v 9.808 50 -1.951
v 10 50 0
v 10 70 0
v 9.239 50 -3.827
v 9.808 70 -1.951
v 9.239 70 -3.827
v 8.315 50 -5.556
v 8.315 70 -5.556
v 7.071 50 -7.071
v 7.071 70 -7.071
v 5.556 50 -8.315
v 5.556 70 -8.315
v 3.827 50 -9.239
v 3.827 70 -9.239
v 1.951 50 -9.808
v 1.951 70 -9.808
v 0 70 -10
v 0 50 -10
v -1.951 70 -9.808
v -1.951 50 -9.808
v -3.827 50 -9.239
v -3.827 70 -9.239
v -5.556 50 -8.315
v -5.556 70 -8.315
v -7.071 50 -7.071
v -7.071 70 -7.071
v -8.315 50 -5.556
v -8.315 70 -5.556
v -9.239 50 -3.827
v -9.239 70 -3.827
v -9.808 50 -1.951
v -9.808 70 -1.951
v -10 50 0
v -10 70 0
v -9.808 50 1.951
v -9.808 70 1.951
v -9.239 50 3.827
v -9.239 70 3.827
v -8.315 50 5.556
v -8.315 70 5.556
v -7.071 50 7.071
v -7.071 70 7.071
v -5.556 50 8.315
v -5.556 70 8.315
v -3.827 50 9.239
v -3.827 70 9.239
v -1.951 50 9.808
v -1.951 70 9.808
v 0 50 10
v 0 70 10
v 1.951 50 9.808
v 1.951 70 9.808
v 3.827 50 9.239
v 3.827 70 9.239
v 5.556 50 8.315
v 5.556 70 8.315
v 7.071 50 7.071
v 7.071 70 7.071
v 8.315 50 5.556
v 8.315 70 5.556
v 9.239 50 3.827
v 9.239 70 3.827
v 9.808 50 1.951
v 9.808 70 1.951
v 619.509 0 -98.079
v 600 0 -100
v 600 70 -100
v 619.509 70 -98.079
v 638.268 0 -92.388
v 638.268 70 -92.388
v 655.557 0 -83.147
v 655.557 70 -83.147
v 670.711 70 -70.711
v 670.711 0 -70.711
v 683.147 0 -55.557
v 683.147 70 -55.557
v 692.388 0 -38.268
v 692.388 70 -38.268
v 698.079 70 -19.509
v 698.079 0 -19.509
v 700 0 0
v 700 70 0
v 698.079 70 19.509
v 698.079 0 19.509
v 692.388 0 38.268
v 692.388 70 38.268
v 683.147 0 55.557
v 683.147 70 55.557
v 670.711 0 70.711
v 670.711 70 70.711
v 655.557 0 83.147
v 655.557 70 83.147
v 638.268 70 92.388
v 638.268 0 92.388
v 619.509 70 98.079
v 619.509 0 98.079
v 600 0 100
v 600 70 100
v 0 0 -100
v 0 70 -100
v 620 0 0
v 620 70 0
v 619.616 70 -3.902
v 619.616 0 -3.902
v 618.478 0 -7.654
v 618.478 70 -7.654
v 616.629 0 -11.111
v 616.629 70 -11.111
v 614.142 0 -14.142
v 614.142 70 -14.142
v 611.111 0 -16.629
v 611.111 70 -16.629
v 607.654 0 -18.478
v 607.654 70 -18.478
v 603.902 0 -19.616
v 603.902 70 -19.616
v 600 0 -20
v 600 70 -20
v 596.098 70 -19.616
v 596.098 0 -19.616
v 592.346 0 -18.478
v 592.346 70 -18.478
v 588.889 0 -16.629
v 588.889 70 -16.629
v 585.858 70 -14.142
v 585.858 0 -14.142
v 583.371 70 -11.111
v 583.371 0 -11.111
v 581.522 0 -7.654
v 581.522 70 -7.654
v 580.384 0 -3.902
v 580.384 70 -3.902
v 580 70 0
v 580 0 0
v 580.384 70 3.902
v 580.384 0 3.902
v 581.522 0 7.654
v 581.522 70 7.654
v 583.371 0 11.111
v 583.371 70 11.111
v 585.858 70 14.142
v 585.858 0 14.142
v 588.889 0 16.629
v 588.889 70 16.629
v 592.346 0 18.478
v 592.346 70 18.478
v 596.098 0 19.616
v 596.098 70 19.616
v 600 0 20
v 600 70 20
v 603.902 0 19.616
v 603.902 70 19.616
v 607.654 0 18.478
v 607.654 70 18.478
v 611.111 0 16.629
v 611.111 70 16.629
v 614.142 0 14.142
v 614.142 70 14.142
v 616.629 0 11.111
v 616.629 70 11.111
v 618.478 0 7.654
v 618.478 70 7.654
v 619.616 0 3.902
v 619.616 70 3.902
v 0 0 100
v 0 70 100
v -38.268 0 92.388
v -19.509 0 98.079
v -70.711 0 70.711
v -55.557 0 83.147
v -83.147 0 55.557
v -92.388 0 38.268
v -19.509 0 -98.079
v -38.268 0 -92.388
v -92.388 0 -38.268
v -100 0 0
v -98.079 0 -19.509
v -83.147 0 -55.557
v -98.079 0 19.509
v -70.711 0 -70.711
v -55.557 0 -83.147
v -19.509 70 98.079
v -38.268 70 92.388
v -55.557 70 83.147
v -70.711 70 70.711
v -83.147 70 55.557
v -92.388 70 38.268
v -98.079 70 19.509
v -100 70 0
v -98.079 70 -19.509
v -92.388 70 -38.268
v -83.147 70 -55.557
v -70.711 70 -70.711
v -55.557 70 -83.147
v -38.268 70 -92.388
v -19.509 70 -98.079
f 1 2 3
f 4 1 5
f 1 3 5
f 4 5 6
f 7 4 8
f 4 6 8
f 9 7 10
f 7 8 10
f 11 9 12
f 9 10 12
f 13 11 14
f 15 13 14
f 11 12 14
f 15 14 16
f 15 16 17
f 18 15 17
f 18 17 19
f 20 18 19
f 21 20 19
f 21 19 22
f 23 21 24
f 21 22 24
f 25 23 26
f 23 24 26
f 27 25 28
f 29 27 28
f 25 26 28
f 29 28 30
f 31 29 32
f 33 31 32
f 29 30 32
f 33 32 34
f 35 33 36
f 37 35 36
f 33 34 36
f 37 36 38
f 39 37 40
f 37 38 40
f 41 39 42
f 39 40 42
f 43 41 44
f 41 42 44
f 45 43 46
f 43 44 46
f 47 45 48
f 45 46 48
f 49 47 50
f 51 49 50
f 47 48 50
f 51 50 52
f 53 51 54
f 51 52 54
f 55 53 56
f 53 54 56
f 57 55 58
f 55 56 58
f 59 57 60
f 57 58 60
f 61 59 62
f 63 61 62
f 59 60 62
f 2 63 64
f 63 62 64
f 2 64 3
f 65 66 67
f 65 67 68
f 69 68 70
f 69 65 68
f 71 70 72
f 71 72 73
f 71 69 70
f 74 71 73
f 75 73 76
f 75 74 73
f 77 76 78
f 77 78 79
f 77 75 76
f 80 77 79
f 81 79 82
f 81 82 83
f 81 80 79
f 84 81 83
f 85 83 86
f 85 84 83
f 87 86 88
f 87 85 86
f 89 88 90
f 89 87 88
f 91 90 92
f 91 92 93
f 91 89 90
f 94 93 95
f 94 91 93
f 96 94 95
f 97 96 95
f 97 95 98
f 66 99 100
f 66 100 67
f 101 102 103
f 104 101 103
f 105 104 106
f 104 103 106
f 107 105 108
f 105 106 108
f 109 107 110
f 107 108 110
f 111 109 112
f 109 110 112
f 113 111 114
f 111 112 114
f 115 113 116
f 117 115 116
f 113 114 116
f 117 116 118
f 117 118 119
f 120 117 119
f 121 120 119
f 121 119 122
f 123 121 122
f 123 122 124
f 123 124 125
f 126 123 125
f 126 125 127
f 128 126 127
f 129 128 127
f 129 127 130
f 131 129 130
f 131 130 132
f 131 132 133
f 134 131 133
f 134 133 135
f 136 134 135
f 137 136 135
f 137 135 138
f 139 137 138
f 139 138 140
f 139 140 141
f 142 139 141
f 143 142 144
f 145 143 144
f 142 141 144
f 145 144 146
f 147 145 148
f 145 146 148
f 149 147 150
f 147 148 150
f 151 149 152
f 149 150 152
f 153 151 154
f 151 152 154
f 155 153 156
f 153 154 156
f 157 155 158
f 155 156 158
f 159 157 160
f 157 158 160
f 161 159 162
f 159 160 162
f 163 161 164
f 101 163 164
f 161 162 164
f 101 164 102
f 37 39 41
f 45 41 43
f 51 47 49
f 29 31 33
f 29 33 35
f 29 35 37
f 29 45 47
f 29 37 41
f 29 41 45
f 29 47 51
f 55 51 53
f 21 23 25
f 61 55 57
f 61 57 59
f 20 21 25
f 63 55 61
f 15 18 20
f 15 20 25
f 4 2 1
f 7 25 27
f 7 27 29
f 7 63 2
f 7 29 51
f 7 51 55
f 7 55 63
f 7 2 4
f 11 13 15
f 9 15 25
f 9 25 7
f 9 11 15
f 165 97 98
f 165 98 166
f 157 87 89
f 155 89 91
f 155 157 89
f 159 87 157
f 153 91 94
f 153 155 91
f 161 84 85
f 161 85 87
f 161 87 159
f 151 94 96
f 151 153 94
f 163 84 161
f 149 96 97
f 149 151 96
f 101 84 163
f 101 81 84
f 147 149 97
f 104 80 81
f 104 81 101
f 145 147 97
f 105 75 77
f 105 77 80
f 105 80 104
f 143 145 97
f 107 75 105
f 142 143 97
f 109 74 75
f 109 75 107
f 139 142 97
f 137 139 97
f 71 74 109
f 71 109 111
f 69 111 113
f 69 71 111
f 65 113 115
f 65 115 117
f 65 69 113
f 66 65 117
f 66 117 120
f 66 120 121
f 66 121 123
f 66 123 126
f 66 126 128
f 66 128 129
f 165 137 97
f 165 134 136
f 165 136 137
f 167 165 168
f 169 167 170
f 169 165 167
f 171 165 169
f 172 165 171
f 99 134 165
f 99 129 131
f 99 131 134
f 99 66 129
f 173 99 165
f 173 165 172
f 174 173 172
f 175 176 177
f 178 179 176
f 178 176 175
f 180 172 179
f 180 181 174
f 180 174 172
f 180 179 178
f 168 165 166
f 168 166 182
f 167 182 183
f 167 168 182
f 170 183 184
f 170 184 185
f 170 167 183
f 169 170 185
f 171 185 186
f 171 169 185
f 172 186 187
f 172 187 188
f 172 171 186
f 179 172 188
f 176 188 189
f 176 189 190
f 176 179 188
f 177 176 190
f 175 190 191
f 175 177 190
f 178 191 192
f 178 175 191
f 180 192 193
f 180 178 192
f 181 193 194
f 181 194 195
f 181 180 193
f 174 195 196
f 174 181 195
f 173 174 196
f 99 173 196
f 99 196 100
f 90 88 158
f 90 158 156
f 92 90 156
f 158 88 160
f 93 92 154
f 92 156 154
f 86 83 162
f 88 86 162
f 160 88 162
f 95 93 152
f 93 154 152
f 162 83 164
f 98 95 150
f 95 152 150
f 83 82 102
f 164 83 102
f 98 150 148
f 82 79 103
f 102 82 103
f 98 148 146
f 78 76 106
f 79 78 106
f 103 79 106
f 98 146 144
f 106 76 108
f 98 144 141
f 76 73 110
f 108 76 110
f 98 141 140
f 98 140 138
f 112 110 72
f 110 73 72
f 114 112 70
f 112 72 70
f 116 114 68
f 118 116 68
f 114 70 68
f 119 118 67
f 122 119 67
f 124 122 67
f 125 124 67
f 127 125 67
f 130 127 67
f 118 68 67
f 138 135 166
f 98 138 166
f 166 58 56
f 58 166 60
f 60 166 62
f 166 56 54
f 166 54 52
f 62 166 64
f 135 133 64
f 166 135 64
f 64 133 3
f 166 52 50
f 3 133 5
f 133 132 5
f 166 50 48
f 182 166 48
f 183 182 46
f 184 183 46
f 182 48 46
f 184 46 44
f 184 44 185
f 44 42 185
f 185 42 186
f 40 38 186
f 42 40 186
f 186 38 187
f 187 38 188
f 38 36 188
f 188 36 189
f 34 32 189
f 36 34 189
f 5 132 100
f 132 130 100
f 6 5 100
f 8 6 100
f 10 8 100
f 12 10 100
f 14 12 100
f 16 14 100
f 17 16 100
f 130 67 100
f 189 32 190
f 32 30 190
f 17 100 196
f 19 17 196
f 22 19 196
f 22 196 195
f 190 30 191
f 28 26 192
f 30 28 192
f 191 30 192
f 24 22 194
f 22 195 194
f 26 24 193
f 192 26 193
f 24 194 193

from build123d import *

# Parameters (mm, degrees)
BOSS_EXTRUDE1_DEPTH = 70
SKETCH2_R           = 10
CUT_EXTRUDE1_DEPTH  = 20
SKETCH3_R           = 20
CUT_EXTRUDE2_DEPTH  = 71


with BuildPart() as part:
    # Sketch1 → Boss-Extrude1 (new body)
    with BuildSketch(Plane(origin=(0, 0, 0), x_dir=(1, 0, 0), z_dir=(0, 1, 0))):
        with BuildLine():
            Line((0, 100), (600, 100))
            ThreePointArc((600, 100), (700, 0), (600, -100))
            Line((600, -100), (0, -100))
            ThreePointArc((0, -100), (-100, 0), (0, 100))
        make_face()
    extrude(amount=BOSS_EXTRUDE1_DEPTH)

    # Sketch2 → Cut-Extrude1 (cut)
    with BuildSketch(Plane(origin=(0, 70, 0), x_dir=(1, 0, 0), z_dir=(0, 1, 0))):
        Circle(SKETCH2_R)
    extrude(amount=-CUT_EXTRUDE1_DEPTH, mode=Mode.SUBTRACT)

    # Sketch3 → Cut-Extrude2 (cut, through all)
    with BuildSketch(Plane(origin=(0, 70, 0), x_dir=(1, 0, 0), z_dir=(0, 1, 0))):
        with Locations((600, 0)):
            Circle(SKETCH3_R)
    extrude(amount=-CUT_EXTRUDE2_DEPTH, mode=Mode.SUBTRACT)


solid = part.part
